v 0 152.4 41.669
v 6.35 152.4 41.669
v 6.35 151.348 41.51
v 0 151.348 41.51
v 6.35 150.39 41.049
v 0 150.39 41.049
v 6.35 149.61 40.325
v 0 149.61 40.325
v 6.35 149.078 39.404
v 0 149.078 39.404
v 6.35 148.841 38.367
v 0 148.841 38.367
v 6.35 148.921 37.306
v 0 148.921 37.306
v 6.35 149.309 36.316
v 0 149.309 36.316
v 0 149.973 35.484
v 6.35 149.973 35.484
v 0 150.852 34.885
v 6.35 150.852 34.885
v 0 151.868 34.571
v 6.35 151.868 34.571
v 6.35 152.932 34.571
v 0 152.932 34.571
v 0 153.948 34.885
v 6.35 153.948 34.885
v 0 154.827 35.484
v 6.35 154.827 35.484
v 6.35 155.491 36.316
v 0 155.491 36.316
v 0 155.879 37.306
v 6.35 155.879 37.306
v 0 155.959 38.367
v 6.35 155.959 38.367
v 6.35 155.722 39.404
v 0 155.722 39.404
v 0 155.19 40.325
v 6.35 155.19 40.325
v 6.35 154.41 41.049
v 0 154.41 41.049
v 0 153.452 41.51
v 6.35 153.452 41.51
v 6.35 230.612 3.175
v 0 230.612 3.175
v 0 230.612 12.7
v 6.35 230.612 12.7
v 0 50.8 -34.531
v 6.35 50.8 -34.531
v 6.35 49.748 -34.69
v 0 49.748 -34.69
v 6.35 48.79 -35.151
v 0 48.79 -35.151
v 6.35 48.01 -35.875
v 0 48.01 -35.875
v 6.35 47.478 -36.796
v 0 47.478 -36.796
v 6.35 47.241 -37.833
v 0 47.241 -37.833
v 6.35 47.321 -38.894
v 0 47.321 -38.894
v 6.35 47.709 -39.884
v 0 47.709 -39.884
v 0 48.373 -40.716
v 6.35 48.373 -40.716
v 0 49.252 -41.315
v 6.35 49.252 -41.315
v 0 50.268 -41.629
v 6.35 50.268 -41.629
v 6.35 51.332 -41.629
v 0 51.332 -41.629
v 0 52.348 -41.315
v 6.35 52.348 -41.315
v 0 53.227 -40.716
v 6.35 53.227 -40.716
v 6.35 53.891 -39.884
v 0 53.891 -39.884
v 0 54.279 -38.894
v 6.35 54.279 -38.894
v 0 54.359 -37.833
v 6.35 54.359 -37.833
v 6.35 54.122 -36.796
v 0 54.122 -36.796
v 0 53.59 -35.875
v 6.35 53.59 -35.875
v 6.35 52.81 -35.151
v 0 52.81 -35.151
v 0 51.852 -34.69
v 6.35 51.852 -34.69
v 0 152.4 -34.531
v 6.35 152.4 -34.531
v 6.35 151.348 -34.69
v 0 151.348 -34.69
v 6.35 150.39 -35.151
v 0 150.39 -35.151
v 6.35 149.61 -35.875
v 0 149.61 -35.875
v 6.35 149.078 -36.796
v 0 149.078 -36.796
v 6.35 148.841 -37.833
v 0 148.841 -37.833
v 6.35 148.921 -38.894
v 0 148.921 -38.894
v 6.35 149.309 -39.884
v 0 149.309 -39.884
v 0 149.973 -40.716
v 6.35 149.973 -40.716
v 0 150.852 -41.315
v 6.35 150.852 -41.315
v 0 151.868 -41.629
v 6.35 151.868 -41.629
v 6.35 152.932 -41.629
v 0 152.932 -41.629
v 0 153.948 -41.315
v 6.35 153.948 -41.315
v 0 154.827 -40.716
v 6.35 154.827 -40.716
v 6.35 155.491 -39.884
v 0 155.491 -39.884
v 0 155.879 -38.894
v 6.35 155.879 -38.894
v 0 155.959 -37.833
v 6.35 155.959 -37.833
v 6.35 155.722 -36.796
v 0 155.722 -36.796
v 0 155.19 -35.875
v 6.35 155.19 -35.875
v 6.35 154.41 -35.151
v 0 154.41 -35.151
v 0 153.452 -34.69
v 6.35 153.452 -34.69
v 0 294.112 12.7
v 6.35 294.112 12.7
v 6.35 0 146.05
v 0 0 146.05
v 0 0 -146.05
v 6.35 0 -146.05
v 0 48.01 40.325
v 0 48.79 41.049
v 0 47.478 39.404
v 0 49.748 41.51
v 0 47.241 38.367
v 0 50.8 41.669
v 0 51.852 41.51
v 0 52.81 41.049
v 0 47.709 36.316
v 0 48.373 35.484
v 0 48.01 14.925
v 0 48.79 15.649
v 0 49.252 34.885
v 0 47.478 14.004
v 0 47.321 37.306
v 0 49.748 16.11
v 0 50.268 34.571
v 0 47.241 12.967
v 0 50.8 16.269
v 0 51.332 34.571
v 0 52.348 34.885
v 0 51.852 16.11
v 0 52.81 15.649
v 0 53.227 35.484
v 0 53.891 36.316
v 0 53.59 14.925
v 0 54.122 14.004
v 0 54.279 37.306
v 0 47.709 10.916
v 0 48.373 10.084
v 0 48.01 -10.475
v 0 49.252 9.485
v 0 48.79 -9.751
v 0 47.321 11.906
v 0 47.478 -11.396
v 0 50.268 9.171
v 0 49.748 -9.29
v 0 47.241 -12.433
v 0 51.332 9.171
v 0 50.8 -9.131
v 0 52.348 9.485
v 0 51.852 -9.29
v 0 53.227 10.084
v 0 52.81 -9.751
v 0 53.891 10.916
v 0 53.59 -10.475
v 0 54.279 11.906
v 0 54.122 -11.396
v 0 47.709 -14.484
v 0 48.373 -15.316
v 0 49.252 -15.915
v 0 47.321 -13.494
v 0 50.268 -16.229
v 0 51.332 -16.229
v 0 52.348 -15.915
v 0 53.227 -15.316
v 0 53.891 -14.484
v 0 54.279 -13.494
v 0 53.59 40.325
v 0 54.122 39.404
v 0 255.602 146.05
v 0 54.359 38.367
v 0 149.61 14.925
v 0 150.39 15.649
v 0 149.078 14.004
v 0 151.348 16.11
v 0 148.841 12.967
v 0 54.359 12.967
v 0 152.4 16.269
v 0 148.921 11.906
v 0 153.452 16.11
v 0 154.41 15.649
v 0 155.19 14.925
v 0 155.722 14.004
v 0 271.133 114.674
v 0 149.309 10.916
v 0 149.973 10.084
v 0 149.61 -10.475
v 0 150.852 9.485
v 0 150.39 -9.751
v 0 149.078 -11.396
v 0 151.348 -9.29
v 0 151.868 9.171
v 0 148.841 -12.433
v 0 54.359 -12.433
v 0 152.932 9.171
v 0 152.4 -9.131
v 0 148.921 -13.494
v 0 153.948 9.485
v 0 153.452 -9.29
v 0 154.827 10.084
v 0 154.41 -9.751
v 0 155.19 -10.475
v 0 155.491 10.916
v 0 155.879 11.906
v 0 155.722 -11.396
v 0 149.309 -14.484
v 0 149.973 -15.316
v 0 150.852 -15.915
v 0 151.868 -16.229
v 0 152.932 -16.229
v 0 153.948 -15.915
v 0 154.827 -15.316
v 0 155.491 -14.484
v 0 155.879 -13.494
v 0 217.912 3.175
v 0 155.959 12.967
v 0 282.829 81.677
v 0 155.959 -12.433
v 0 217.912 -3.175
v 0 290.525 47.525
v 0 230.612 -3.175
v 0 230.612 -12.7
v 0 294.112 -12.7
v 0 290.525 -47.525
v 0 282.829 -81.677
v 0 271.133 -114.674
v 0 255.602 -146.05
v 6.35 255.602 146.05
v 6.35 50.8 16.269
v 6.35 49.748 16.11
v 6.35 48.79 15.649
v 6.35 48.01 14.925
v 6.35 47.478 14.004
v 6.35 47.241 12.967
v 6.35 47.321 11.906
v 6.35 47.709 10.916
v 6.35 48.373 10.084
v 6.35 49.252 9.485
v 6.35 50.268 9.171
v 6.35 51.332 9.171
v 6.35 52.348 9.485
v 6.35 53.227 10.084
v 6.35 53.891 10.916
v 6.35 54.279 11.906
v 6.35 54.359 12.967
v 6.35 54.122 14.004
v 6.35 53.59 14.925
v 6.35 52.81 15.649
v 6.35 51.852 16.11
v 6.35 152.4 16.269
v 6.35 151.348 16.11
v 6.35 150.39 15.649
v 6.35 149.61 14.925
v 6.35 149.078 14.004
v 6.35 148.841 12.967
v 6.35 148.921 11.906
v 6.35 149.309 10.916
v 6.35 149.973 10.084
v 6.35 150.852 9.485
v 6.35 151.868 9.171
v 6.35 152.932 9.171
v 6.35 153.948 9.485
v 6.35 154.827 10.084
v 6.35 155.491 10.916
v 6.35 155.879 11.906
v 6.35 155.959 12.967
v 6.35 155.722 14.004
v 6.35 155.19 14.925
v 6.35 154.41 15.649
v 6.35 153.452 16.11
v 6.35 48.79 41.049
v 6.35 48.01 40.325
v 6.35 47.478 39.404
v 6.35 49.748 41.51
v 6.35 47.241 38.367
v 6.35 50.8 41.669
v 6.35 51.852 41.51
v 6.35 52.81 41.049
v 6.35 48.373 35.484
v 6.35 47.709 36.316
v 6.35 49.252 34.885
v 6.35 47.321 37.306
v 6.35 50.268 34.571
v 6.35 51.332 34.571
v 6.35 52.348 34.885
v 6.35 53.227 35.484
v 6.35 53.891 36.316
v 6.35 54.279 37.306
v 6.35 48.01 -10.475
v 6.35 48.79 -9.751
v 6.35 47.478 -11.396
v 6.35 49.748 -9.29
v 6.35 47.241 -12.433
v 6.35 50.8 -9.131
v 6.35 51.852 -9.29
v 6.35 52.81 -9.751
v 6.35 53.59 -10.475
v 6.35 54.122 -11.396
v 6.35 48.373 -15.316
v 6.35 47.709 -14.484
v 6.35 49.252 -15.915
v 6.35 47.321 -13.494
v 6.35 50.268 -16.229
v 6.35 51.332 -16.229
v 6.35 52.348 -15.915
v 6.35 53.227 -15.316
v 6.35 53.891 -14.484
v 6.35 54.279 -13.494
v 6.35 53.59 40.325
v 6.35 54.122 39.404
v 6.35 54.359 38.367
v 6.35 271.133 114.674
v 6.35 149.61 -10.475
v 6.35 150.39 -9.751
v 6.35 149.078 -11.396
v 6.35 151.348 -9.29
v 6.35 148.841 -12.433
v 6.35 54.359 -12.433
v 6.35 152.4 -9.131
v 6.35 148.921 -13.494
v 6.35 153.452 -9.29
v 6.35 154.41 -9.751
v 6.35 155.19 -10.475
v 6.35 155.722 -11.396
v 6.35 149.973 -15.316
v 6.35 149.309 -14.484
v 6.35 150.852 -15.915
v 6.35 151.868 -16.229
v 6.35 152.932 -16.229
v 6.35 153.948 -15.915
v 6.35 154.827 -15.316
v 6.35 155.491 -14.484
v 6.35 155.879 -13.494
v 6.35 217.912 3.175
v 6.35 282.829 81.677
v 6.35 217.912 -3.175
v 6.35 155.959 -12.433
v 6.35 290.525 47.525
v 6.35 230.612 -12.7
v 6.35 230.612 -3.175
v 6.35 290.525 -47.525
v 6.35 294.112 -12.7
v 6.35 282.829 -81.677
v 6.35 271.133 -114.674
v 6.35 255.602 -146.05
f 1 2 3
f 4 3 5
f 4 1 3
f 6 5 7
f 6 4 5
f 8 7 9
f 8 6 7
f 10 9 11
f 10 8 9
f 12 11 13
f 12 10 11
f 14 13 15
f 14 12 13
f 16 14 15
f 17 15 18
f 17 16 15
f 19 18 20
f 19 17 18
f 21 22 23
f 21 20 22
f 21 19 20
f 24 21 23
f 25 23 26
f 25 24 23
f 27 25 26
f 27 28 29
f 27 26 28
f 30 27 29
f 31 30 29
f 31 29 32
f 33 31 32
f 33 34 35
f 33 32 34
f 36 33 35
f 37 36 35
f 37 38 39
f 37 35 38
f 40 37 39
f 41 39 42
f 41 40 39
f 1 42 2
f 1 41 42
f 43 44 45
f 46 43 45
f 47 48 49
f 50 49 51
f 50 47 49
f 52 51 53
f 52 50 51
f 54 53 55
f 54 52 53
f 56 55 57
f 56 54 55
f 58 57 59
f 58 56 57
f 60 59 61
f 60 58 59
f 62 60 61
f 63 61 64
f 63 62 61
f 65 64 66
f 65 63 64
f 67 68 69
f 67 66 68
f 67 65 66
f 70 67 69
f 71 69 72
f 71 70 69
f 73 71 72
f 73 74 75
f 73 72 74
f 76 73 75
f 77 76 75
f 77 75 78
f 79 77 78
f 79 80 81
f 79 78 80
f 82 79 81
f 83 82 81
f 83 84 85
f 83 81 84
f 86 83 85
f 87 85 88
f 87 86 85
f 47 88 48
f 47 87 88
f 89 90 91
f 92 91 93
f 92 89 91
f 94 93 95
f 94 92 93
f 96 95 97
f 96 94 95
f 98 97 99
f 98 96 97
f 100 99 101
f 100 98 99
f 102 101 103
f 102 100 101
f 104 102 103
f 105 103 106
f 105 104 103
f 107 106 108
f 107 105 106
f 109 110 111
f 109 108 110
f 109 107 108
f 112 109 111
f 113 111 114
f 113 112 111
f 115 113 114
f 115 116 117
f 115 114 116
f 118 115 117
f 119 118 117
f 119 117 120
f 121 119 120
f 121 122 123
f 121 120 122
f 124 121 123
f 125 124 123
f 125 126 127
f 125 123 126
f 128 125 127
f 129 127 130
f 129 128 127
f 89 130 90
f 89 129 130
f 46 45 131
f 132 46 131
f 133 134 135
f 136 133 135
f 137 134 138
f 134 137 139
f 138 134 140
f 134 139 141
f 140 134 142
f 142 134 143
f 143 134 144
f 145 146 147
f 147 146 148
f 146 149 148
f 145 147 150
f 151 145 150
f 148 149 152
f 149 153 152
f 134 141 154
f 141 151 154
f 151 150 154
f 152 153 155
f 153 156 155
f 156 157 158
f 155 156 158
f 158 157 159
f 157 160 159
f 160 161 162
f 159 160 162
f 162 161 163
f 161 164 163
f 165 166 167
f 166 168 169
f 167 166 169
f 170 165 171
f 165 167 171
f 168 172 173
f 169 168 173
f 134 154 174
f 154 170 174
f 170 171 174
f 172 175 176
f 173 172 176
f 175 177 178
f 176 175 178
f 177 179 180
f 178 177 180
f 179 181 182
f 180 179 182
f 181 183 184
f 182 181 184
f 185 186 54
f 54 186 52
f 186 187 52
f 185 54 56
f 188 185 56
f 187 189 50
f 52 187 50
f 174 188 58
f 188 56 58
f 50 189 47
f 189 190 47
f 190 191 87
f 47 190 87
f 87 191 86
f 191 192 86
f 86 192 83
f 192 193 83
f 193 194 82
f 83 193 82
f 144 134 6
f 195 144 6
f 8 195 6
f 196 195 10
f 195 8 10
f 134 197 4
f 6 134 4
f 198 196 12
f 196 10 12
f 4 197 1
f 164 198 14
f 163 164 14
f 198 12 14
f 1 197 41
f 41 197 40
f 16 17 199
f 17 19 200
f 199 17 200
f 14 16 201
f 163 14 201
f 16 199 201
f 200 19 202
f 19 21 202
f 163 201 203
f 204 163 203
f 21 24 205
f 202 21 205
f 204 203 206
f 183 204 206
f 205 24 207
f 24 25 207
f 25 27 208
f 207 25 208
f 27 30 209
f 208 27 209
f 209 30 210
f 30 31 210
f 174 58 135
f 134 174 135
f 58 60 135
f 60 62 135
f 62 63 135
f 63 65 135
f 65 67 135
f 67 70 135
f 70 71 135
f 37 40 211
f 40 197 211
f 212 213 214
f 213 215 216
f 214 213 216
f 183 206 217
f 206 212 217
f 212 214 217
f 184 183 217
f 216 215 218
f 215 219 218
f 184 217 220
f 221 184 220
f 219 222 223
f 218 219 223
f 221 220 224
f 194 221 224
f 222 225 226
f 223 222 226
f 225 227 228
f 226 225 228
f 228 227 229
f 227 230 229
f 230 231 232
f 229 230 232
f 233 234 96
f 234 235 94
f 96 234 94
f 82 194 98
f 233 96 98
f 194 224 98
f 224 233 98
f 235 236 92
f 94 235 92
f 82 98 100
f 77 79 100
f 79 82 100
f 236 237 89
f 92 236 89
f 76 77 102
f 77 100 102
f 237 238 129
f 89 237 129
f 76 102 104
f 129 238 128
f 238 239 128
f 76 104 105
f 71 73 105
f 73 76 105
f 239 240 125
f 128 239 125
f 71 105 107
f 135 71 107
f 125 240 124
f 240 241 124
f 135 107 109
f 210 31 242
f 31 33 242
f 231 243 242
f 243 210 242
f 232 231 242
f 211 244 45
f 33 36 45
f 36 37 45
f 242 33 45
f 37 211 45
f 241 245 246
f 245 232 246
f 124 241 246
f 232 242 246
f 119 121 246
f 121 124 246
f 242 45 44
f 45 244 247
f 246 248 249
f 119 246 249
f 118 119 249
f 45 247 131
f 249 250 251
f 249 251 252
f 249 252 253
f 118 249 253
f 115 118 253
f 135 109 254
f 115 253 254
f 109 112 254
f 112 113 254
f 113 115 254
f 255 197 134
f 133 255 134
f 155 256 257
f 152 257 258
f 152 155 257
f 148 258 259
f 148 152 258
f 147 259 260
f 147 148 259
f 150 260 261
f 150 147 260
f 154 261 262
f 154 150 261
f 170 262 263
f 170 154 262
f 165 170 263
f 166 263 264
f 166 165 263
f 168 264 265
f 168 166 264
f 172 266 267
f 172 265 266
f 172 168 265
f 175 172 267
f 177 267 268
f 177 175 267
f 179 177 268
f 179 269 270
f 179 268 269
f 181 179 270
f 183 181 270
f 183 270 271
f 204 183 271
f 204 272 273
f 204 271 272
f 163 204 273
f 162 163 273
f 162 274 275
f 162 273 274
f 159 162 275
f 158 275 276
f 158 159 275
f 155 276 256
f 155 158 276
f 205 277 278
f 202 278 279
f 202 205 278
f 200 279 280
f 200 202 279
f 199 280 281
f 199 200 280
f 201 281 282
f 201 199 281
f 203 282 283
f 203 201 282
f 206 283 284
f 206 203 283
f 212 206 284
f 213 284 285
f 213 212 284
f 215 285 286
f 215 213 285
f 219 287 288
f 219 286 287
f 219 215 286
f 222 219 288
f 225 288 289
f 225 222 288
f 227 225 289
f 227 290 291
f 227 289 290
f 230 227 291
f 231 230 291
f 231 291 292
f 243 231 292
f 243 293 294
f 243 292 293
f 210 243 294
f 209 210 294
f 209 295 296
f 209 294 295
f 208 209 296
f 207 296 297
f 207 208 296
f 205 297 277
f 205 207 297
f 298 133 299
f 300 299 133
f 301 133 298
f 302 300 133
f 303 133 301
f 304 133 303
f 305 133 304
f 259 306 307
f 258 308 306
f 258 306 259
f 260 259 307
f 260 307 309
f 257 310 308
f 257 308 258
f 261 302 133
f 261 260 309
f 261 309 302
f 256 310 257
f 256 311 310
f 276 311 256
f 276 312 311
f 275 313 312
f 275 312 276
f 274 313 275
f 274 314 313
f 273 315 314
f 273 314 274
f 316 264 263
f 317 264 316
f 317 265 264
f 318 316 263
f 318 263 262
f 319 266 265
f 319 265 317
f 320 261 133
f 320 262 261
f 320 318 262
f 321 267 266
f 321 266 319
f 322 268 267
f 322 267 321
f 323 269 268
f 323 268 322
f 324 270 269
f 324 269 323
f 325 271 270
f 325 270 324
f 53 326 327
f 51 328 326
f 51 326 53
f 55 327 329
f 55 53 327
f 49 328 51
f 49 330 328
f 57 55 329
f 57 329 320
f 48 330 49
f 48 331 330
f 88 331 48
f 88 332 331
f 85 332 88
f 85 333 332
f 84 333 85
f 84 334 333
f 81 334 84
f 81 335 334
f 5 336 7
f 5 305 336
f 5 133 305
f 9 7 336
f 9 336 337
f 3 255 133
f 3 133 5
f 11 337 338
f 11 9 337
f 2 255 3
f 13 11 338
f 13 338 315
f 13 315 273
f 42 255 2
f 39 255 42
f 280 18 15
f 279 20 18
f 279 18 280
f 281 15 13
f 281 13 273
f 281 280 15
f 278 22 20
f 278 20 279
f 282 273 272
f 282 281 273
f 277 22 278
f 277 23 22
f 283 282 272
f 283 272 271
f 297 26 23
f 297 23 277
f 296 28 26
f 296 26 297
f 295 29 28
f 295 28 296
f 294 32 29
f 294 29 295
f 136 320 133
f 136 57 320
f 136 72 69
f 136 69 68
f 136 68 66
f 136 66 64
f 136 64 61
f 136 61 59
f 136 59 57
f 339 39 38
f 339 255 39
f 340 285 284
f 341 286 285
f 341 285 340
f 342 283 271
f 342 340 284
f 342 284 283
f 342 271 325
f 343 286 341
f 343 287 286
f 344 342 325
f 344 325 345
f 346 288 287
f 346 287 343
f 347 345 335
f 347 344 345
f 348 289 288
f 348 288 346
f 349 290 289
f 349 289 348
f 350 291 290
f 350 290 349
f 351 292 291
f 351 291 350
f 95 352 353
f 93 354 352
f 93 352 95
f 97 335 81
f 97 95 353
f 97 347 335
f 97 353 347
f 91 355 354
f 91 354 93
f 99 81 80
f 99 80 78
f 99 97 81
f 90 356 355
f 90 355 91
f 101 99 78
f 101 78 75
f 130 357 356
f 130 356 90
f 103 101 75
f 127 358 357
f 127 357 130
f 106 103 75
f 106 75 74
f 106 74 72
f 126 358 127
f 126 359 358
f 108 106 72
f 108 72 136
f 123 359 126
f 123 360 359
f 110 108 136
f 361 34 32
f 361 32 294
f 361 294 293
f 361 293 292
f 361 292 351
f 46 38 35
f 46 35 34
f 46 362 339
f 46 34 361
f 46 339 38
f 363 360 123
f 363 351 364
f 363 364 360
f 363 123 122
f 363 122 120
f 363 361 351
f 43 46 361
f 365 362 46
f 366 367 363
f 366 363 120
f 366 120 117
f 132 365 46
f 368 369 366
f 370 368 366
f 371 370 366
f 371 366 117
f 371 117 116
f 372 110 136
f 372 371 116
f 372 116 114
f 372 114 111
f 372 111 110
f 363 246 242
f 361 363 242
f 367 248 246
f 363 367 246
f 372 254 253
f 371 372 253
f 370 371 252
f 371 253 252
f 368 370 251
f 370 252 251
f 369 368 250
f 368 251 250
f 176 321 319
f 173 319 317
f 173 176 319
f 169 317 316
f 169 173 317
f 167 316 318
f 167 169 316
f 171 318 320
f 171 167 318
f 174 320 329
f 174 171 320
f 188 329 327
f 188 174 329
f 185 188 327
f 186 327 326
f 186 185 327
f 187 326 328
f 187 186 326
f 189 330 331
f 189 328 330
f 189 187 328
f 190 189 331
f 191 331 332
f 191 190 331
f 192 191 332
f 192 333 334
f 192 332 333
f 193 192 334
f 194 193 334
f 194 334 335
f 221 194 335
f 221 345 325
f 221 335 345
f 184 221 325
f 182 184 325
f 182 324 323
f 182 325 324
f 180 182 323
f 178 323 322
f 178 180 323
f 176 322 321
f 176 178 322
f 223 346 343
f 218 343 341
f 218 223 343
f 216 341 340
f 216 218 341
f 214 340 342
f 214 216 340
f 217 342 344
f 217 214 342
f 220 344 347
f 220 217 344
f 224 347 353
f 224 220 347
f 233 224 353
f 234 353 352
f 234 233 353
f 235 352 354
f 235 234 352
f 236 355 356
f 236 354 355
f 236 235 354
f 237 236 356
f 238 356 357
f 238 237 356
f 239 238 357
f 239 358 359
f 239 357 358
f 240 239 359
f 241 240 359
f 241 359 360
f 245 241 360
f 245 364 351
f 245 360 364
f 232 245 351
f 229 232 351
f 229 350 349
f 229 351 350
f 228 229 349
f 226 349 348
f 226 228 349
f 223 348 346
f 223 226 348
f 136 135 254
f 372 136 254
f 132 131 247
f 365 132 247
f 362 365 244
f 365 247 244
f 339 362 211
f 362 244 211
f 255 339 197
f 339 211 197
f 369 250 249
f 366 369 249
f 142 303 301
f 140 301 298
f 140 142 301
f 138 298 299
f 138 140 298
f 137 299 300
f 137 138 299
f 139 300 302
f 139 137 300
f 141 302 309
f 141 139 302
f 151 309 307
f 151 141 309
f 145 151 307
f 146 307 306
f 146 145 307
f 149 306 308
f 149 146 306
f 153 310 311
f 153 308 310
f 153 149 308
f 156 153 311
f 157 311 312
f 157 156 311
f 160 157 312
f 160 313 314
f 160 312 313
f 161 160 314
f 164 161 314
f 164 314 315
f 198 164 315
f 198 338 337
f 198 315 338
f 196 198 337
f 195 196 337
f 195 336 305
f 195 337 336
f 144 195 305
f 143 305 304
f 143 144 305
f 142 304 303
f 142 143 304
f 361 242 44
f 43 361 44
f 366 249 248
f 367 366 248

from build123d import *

# Parameters (mm, degrees)
BOSS_EXTRUDE1_DEPTH = 6.35
SKETCH2_R           = 3.5687
CUT_EXTRUDE1_DEPTH  = 149.606


with BuildPart() as part:
    # Sketch1 → Boss-Extrude1 (new body)
    with BuildSketch(Plane(origin=(0, 0, 0), x_dir=(0, 0, -1), z_dir=(1, 0, 0))):
        with BuildLine():
            Line((0, 0), (146.05, 0))
            Line((146.05, 0), (146.05, 255.602258394))
            ThreePointArc((146.05, 255.602258394), (81.677042764, 282.828530529), (12.7, 294.111929367))
            Line((12.7, 294.111929367), (12.7, 230.611929367))
            Line((12.7, 230.611929367), (3.175, 230.611929367))
            Line((3.175, 230.611929367), (3.175, 217.911929367))
            Line((3.175, 217.911929367), (-3.175, 217.911929367))
            Line((-3.175, 217.911929367), (-3.175, 230.611929367))
            Line((-3.175, 230.611929367), (-12.7, 230.611929367))
            Line((-12.7, 230.611929367), (-12.7, 294.111929367))
            ThreePointArc((-12.7, 294.111929367), (-81.677042764, 282.828530529), (-146.05, 255.602258394))
            Line((-146.05, 255.602258394), (-146.05, 0))
            Line((-146.05, 0), (0, 0))
        make_face()
    extrude(amount=BOSS_EXTRUDE1_DEPTH)

    # Sketch2 → Cut-Extrude1 (cut)
    with BuildSketch(Plane(origin=(0, 0, 0), x_dir=(0, 0, -1), z_dir=(1, 0, 0))):
        with Locations(Location((12.7, 50.8, 0), (0, 0, 180))):
            Circle(SKETCH2_R)
        with Locations(Location((38.1, 50.8, 0), (0, 0, 180))):
            Circle(SKETCH2_R)
        with Locations(Location((12.7, 152.4, 0), (0, 0, 180))):
            Circle(SKETCH2_R)
        with Locations(Location((38.1, 152.4, 0), (0, 0, 180))):
            Circle(SKETCH2_R)
        with Locations(Location((-12.7, 50.8, 0), (0, 0, 180))):
            Circle(SKETCH2_R)
        with Locations(Location((-38.1, 50.8, 0), (0, 0, 180))):
            Circle(SKETCH2_R)
        with Locations(Location((-38.1, 152.4, 0), (0, 0, 180))):
            Circle(SKETCH2_R)
        with Locations(Location((-12.7, 152.4, 0), (0, 0, 180))):
            Circle(SKETCH2_R)
    extrude(amount=CUT_EXTRUDE1_DEPTH, mode=Mode.SUBTRACT)


solid = part.part
